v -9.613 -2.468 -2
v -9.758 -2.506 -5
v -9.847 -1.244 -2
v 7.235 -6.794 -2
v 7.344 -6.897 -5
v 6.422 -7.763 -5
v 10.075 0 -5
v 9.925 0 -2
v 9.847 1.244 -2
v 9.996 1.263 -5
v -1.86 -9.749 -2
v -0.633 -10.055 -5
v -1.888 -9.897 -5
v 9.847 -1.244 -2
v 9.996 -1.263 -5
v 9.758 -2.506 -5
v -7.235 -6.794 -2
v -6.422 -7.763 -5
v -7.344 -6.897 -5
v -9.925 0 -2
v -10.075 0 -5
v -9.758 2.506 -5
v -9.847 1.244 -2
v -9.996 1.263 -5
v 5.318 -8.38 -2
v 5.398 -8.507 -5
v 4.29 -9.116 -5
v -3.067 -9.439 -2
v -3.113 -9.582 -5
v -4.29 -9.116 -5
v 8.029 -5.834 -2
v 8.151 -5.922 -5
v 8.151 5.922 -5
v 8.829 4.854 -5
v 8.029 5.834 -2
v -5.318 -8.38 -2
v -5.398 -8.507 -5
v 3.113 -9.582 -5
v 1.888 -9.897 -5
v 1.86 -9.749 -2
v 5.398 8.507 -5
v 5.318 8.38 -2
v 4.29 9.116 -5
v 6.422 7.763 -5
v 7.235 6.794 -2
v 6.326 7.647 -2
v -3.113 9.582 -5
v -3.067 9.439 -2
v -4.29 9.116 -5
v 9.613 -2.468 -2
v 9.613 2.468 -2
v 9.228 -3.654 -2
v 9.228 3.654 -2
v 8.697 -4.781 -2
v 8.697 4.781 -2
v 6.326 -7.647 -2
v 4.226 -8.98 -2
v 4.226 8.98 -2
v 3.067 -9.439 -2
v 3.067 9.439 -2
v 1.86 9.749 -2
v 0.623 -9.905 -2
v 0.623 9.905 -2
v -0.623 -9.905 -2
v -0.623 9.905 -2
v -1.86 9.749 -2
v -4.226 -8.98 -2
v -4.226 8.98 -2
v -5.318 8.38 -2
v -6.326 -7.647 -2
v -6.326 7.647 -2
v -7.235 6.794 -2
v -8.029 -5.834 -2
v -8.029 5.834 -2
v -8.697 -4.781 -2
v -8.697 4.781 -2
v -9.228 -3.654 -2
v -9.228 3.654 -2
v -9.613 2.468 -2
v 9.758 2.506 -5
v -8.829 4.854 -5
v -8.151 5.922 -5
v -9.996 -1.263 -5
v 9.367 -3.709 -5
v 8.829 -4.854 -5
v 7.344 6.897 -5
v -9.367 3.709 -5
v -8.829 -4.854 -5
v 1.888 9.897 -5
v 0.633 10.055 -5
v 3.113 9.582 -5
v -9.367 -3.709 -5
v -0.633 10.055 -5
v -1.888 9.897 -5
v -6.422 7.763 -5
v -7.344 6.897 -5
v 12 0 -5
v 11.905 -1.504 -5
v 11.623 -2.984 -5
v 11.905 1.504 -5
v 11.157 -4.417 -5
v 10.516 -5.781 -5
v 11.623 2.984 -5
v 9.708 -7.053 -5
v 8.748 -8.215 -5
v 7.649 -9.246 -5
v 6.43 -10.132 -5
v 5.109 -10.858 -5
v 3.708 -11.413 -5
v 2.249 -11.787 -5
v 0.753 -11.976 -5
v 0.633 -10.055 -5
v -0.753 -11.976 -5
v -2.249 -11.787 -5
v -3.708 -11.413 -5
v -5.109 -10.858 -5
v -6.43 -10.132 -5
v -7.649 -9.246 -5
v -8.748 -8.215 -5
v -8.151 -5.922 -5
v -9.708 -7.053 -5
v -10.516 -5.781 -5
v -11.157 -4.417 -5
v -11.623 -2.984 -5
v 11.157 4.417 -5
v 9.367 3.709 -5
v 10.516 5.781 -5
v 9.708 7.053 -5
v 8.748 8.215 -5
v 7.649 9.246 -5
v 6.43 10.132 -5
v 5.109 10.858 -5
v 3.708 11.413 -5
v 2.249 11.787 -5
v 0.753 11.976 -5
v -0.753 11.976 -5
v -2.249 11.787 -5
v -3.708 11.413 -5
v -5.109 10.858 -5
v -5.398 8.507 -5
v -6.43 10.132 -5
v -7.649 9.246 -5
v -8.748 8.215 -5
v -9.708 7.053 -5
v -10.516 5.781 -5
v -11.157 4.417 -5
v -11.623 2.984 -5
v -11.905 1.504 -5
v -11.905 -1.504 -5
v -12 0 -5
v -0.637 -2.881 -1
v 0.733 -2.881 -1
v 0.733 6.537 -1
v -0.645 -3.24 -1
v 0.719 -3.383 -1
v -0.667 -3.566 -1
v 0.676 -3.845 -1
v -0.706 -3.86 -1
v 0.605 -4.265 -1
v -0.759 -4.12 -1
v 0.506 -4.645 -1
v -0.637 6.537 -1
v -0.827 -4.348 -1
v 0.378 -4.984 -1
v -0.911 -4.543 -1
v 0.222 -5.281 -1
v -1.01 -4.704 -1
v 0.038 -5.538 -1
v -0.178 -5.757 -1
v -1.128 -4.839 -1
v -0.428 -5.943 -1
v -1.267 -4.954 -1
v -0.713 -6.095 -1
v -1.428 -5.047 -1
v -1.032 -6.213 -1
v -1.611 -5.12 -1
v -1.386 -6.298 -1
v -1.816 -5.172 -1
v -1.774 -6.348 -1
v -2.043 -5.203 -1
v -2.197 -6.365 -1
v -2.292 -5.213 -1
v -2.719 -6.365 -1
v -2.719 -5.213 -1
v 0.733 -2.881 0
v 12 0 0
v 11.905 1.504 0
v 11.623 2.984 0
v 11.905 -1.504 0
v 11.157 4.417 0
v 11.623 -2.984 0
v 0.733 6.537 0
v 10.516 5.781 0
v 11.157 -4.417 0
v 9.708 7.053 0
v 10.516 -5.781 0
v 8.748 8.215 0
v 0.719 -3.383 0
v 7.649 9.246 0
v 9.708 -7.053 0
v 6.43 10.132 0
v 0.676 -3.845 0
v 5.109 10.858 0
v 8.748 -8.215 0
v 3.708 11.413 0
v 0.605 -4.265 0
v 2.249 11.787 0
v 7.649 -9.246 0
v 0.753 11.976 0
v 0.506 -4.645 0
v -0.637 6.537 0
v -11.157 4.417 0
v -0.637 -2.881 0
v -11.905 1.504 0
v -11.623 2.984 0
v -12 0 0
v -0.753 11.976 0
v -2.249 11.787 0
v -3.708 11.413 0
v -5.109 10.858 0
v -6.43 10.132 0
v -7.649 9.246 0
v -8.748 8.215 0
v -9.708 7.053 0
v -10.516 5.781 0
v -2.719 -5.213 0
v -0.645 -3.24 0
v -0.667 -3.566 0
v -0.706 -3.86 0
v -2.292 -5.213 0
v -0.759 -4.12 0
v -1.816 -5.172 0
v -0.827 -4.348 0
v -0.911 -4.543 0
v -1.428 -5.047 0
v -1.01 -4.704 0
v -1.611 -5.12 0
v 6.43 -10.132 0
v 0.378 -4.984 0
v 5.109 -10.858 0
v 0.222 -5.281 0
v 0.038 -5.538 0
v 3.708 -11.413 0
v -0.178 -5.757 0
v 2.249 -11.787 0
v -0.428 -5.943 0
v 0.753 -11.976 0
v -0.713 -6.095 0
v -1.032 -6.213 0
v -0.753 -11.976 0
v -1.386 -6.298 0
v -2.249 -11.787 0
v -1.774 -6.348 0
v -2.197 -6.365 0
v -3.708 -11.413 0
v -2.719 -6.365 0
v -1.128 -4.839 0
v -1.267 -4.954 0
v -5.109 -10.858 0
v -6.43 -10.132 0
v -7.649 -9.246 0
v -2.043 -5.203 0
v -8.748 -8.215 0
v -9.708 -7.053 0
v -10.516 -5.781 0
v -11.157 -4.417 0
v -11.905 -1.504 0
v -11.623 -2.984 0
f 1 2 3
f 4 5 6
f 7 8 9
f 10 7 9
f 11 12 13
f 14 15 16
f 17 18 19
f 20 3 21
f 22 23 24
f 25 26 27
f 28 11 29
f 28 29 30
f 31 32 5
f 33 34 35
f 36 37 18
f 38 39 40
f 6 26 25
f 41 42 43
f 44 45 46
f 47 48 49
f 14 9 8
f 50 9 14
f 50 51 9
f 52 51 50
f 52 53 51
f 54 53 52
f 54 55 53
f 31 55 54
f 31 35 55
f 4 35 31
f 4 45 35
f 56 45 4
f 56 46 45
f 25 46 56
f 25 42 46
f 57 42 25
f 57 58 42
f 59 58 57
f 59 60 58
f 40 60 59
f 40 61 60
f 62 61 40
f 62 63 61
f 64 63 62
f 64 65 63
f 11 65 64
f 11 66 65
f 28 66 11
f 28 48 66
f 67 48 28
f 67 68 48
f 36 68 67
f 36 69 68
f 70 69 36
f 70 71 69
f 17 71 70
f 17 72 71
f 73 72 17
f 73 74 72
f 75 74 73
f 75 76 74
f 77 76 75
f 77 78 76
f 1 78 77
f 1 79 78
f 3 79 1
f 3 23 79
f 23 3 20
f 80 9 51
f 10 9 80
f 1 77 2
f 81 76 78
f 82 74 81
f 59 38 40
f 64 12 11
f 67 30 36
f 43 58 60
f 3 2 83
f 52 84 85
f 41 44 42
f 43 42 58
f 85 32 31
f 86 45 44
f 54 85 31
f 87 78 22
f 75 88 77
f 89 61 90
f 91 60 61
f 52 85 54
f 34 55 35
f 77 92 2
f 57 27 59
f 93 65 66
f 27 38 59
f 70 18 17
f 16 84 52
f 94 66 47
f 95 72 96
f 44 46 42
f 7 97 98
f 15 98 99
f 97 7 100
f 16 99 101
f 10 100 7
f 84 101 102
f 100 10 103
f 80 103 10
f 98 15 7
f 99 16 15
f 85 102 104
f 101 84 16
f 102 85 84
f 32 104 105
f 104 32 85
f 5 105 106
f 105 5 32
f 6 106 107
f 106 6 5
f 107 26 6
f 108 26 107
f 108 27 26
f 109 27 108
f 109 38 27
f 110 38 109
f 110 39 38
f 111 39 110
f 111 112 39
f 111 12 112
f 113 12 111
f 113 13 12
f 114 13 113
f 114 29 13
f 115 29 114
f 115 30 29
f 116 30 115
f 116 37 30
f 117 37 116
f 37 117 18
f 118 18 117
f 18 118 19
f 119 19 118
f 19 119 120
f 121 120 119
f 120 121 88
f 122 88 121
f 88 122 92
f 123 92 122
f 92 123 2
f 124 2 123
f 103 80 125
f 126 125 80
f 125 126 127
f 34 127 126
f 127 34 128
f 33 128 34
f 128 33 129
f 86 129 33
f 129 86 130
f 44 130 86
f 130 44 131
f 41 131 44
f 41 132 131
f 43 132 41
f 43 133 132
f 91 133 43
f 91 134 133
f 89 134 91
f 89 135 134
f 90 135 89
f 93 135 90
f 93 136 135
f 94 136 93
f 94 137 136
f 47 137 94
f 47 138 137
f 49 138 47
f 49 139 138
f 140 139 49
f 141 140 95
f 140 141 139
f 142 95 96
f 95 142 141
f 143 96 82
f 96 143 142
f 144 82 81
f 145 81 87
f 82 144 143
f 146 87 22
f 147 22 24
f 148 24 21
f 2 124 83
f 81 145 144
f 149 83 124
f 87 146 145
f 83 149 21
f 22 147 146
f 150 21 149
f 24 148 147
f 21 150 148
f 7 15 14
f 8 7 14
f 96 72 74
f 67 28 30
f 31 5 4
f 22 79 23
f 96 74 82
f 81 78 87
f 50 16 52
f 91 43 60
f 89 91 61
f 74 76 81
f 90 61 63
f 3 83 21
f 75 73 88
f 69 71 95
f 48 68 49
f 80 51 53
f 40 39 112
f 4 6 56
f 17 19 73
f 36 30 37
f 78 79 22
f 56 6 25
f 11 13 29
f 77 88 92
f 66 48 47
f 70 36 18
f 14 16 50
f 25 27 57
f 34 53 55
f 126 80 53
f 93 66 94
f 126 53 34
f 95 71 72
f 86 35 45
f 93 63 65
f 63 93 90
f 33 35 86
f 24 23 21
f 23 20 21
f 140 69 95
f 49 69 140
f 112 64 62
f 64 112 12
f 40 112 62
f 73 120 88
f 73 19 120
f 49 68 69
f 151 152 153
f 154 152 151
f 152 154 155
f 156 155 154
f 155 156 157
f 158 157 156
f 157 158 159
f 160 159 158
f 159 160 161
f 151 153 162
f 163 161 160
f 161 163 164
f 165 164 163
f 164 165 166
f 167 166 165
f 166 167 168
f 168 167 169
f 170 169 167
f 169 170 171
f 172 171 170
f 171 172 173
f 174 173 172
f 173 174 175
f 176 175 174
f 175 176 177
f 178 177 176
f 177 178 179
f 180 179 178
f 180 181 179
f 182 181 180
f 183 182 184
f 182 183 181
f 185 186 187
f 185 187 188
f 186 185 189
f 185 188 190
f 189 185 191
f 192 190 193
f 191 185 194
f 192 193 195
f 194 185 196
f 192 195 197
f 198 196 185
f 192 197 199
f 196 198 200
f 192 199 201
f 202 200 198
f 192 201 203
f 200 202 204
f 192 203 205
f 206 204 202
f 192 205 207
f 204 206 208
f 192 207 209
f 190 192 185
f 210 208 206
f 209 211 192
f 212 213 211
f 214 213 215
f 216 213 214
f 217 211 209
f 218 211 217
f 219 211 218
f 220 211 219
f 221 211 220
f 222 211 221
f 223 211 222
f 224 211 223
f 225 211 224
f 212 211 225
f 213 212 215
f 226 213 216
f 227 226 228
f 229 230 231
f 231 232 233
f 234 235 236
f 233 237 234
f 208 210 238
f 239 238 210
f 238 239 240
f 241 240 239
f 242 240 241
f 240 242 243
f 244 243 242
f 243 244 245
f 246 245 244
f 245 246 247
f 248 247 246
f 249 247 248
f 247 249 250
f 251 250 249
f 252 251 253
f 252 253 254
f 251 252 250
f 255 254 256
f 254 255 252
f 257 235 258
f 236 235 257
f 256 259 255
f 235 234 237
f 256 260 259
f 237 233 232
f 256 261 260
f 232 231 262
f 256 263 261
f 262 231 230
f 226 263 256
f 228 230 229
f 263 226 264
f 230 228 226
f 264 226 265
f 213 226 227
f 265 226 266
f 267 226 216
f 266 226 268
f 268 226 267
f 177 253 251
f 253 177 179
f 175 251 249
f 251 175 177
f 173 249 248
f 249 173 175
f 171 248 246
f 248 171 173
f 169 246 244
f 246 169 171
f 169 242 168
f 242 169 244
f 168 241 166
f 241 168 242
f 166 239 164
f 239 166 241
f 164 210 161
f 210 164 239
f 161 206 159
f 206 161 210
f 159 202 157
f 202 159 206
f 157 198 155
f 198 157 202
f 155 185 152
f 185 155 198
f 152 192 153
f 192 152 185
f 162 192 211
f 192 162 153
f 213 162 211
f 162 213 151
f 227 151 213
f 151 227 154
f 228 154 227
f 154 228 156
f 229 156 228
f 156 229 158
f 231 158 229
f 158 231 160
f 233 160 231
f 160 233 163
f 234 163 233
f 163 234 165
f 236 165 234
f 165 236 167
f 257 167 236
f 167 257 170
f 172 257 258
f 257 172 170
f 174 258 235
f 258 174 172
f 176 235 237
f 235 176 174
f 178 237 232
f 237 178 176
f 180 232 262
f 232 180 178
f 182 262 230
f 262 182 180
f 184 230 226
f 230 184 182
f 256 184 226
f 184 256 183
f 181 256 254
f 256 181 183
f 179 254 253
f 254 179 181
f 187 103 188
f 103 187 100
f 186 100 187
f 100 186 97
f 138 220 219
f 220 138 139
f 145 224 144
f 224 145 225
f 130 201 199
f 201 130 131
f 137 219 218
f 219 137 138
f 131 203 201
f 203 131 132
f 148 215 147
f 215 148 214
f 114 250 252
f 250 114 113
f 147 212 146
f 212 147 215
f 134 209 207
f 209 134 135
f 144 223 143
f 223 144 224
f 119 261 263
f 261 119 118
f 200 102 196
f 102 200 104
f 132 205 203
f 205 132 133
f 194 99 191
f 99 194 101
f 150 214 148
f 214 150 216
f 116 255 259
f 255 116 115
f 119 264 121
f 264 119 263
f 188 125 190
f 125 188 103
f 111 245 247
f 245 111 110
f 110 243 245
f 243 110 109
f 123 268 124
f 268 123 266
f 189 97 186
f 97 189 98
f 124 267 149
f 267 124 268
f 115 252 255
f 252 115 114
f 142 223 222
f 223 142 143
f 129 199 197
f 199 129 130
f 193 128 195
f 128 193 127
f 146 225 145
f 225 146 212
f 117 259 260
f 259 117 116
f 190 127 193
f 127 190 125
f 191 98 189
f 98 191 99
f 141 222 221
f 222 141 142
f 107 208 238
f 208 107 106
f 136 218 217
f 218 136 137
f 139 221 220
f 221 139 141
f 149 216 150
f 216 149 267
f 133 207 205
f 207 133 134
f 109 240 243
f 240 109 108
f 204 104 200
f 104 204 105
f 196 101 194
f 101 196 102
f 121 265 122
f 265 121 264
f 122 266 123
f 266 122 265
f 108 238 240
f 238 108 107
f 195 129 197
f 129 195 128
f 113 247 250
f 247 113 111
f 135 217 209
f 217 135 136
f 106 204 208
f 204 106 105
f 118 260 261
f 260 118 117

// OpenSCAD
$fn = 50;


difference() {
	union() {
		translate(v = [0, 0, -5.0000000000]) {
			cylinder(h = 5, r = 12.0000000000);
		}
	}
	union() {
		#translate(v = [0, 0, -5.0000000000]) {
			cylinder(h = 3, r1 = 10.0750000000, r2 = 9.9250000000);
		}
		translate(v = [0, 0, -1]) {
			linear_extrude(height = 1) {
				text(font = "Impact", halign = "center", size = 10, text = "J", valign = "center");
			}
		}
	}
}
